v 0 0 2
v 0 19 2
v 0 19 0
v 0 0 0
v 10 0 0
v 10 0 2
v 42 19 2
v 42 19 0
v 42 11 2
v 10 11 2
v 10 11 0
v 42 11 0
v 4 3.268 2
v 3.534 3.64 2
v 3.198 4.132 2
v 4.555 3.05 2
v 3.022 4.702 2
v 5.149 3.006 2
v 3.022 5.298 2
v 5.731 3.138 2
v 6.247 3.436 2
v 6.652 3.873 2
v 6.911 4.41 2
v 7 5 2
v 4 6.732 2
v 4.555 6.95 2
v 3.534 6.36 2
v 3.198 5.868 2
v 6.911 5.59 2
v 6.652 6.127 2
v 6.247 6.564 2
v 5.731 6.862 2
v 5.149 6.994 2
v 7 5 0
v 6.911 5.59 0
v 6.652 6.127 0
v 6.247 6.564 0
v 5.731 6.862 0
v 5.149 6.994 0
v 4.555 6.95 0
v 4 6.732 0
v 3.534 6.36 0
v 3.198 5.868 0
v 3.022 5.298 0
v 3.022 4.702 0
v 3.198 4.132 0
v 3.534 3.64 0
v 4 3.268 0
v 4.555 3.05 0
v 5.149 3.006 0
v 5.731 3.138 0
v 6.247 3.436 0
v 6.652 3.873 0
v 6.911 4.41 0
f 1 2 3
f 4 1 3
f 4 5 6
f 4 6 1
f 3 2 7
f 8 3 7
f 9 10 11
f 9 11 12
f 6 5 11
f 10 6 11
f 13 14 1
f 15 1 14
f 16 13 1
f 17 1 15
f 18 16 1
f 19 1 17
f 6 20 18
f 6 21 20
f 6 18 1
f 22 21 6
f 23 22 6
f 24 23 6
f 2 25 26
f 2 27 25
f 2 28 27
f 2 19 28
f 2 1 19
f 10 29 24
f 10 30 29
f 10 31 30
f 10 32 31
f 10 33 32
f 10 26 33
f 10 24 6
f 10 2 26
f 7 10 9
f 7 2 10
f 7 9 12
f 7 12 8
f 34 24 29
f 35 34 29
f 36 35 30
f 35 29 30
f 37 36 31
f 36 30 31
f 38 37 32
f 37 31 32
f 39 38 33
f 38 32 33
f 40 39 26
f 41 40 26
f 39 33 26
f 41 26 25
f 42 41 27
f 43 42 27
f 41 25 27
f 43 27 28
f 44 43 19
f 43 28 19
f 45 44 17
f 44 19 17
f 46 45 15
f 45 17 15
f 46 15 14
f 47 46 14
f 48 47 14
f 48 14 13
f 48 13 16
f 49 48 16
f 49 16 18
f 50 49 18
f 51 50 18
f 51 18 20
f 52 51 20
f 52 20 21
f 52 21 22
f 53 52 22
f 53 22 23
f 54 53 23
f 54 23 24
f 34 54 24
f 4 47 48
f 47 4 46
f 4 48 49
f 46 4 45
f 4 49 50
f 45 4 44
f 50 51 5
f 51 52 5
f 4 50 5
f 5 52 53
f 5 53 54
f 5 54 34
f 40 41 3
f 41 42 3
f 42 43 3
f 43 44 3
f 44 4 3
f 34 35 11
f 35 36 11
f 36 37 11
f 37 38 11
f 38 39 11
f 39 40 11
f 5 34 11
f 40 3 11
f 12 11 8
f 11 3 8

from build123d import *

# Parameters (mm, degrees)
BASE_FLANGE1_DEPTH      = 19
CUT_EXTRUDE1_DEPTH      = 47.270941205
CUT_EXTRUDE1_DEPTH_BACK = 47.270941205
SKETCH5_W               = 32
SKETCH5_H               = 11
SKETCH6_R               = 2
CUT_EXTRUDE2_DEPTH      = 47.270941205
CUT_EXTRUDE4_DEPTH      = 47.270941205
CUT_EXTRUDE4_DEPTH_BACK = 47.270941205
SKETCH7_W               = 30.575
SKETCH7_H               = 8
SKETCH8_W               = 30.575
SKETCH8_H               = 8
TAB1_DEPTH              = 2


# Sheet-metal steps are written as plain solids
with BuildPart() as part:
    # Sketch2 → Base-Flange1 (new body)
    with BuildSketch(Plane(origin=(0, 0, 0), x_dir=(1, 0, 0), z_dir=(0, 1, 0))):
        with BuildLine():
            Line((0, 0), (12.85, 0))
            ThreePointArc((12.85, 0), (14.37027958, -0.62972042), (15, -2.15))
            Line((15, -2.15), (15, -3.85))
            ThreePointArc((15, -3.85), (15.043933983, -3.956066017), (15.15, -4))
            Line((15.15, -4), (42, -4))
            Line((42, -4), (42, -6))
            Line((42, -6), (15.15, -6))
            ThreePointArc((15.15, -6), (13.62972042, -5.37027958), (13, -3.85))
            Line((13, -3.85), (13, -2.15))
            ThreePointArc((13, -2.15), (12.956066017, -2.043933983), (12.85, -2))
            Line((12.85, -2), (0, -2))
            Line((0, -2), (0, 0))
        make_face()
    extrude(amount=BASE_FLANGE1_DEPTH)

    # Sketch5 → Cut-Extrude1 (cut, two sides: drawn at the far end of the back side and taken through both)
    with BuildSketch(Plane.XY.offset(2).offset(-CUT_EXTRUDE1_DEPTH_BACK)):
        with Locations((26, 5.5)):
            Rectangle(SKETCH5_W, SKETCH5_H)
    extrude(amount=CUT_EXTRUDE1_DEPTH + CUT_EXTRUDE1_DEPTH_BACK, mode=Mode.SUBTRACT)

    # Sketch6 → Cut-Extrude2 (cut, through all)
    with BuildSketch(Plane.XY.offset(2)):
        with Locations((5, 5)):
            Circle(SKETCH6_R)
    extrude(amount=-CUT_EXTRUDE2_DEPTH, mode=Mode.SUBTRACT)

    # Sketch7 → Cut-Extrude4 (cut, two sides: drawn at the far end of the back side and taken through both)
    with BuildSketch(Plane.XY.offset(2).offset(-CUT_EXTRUDE4_DEPTH_BACK)):
        with Locations((26.7125, 15)):
            Rectangle(SKETCH7_W, SKETCH7_H)
    extrude(amount=CUT_EXTRUDE4_DEPTH + CUT_EXTRUDE4_DEPTH_BACK, mode=Mode.SUBTRACT)

    # Sketch8 → Tab1 (add)
    with BuildSketch(Plane.XY.offset(2)):
        with Locations((26.7125, 15)):
            Rectangle(SKETCH8_W, SKETCH8_H)
    extrude(amount=-TAB1_DEPTH)


solid = part.part
